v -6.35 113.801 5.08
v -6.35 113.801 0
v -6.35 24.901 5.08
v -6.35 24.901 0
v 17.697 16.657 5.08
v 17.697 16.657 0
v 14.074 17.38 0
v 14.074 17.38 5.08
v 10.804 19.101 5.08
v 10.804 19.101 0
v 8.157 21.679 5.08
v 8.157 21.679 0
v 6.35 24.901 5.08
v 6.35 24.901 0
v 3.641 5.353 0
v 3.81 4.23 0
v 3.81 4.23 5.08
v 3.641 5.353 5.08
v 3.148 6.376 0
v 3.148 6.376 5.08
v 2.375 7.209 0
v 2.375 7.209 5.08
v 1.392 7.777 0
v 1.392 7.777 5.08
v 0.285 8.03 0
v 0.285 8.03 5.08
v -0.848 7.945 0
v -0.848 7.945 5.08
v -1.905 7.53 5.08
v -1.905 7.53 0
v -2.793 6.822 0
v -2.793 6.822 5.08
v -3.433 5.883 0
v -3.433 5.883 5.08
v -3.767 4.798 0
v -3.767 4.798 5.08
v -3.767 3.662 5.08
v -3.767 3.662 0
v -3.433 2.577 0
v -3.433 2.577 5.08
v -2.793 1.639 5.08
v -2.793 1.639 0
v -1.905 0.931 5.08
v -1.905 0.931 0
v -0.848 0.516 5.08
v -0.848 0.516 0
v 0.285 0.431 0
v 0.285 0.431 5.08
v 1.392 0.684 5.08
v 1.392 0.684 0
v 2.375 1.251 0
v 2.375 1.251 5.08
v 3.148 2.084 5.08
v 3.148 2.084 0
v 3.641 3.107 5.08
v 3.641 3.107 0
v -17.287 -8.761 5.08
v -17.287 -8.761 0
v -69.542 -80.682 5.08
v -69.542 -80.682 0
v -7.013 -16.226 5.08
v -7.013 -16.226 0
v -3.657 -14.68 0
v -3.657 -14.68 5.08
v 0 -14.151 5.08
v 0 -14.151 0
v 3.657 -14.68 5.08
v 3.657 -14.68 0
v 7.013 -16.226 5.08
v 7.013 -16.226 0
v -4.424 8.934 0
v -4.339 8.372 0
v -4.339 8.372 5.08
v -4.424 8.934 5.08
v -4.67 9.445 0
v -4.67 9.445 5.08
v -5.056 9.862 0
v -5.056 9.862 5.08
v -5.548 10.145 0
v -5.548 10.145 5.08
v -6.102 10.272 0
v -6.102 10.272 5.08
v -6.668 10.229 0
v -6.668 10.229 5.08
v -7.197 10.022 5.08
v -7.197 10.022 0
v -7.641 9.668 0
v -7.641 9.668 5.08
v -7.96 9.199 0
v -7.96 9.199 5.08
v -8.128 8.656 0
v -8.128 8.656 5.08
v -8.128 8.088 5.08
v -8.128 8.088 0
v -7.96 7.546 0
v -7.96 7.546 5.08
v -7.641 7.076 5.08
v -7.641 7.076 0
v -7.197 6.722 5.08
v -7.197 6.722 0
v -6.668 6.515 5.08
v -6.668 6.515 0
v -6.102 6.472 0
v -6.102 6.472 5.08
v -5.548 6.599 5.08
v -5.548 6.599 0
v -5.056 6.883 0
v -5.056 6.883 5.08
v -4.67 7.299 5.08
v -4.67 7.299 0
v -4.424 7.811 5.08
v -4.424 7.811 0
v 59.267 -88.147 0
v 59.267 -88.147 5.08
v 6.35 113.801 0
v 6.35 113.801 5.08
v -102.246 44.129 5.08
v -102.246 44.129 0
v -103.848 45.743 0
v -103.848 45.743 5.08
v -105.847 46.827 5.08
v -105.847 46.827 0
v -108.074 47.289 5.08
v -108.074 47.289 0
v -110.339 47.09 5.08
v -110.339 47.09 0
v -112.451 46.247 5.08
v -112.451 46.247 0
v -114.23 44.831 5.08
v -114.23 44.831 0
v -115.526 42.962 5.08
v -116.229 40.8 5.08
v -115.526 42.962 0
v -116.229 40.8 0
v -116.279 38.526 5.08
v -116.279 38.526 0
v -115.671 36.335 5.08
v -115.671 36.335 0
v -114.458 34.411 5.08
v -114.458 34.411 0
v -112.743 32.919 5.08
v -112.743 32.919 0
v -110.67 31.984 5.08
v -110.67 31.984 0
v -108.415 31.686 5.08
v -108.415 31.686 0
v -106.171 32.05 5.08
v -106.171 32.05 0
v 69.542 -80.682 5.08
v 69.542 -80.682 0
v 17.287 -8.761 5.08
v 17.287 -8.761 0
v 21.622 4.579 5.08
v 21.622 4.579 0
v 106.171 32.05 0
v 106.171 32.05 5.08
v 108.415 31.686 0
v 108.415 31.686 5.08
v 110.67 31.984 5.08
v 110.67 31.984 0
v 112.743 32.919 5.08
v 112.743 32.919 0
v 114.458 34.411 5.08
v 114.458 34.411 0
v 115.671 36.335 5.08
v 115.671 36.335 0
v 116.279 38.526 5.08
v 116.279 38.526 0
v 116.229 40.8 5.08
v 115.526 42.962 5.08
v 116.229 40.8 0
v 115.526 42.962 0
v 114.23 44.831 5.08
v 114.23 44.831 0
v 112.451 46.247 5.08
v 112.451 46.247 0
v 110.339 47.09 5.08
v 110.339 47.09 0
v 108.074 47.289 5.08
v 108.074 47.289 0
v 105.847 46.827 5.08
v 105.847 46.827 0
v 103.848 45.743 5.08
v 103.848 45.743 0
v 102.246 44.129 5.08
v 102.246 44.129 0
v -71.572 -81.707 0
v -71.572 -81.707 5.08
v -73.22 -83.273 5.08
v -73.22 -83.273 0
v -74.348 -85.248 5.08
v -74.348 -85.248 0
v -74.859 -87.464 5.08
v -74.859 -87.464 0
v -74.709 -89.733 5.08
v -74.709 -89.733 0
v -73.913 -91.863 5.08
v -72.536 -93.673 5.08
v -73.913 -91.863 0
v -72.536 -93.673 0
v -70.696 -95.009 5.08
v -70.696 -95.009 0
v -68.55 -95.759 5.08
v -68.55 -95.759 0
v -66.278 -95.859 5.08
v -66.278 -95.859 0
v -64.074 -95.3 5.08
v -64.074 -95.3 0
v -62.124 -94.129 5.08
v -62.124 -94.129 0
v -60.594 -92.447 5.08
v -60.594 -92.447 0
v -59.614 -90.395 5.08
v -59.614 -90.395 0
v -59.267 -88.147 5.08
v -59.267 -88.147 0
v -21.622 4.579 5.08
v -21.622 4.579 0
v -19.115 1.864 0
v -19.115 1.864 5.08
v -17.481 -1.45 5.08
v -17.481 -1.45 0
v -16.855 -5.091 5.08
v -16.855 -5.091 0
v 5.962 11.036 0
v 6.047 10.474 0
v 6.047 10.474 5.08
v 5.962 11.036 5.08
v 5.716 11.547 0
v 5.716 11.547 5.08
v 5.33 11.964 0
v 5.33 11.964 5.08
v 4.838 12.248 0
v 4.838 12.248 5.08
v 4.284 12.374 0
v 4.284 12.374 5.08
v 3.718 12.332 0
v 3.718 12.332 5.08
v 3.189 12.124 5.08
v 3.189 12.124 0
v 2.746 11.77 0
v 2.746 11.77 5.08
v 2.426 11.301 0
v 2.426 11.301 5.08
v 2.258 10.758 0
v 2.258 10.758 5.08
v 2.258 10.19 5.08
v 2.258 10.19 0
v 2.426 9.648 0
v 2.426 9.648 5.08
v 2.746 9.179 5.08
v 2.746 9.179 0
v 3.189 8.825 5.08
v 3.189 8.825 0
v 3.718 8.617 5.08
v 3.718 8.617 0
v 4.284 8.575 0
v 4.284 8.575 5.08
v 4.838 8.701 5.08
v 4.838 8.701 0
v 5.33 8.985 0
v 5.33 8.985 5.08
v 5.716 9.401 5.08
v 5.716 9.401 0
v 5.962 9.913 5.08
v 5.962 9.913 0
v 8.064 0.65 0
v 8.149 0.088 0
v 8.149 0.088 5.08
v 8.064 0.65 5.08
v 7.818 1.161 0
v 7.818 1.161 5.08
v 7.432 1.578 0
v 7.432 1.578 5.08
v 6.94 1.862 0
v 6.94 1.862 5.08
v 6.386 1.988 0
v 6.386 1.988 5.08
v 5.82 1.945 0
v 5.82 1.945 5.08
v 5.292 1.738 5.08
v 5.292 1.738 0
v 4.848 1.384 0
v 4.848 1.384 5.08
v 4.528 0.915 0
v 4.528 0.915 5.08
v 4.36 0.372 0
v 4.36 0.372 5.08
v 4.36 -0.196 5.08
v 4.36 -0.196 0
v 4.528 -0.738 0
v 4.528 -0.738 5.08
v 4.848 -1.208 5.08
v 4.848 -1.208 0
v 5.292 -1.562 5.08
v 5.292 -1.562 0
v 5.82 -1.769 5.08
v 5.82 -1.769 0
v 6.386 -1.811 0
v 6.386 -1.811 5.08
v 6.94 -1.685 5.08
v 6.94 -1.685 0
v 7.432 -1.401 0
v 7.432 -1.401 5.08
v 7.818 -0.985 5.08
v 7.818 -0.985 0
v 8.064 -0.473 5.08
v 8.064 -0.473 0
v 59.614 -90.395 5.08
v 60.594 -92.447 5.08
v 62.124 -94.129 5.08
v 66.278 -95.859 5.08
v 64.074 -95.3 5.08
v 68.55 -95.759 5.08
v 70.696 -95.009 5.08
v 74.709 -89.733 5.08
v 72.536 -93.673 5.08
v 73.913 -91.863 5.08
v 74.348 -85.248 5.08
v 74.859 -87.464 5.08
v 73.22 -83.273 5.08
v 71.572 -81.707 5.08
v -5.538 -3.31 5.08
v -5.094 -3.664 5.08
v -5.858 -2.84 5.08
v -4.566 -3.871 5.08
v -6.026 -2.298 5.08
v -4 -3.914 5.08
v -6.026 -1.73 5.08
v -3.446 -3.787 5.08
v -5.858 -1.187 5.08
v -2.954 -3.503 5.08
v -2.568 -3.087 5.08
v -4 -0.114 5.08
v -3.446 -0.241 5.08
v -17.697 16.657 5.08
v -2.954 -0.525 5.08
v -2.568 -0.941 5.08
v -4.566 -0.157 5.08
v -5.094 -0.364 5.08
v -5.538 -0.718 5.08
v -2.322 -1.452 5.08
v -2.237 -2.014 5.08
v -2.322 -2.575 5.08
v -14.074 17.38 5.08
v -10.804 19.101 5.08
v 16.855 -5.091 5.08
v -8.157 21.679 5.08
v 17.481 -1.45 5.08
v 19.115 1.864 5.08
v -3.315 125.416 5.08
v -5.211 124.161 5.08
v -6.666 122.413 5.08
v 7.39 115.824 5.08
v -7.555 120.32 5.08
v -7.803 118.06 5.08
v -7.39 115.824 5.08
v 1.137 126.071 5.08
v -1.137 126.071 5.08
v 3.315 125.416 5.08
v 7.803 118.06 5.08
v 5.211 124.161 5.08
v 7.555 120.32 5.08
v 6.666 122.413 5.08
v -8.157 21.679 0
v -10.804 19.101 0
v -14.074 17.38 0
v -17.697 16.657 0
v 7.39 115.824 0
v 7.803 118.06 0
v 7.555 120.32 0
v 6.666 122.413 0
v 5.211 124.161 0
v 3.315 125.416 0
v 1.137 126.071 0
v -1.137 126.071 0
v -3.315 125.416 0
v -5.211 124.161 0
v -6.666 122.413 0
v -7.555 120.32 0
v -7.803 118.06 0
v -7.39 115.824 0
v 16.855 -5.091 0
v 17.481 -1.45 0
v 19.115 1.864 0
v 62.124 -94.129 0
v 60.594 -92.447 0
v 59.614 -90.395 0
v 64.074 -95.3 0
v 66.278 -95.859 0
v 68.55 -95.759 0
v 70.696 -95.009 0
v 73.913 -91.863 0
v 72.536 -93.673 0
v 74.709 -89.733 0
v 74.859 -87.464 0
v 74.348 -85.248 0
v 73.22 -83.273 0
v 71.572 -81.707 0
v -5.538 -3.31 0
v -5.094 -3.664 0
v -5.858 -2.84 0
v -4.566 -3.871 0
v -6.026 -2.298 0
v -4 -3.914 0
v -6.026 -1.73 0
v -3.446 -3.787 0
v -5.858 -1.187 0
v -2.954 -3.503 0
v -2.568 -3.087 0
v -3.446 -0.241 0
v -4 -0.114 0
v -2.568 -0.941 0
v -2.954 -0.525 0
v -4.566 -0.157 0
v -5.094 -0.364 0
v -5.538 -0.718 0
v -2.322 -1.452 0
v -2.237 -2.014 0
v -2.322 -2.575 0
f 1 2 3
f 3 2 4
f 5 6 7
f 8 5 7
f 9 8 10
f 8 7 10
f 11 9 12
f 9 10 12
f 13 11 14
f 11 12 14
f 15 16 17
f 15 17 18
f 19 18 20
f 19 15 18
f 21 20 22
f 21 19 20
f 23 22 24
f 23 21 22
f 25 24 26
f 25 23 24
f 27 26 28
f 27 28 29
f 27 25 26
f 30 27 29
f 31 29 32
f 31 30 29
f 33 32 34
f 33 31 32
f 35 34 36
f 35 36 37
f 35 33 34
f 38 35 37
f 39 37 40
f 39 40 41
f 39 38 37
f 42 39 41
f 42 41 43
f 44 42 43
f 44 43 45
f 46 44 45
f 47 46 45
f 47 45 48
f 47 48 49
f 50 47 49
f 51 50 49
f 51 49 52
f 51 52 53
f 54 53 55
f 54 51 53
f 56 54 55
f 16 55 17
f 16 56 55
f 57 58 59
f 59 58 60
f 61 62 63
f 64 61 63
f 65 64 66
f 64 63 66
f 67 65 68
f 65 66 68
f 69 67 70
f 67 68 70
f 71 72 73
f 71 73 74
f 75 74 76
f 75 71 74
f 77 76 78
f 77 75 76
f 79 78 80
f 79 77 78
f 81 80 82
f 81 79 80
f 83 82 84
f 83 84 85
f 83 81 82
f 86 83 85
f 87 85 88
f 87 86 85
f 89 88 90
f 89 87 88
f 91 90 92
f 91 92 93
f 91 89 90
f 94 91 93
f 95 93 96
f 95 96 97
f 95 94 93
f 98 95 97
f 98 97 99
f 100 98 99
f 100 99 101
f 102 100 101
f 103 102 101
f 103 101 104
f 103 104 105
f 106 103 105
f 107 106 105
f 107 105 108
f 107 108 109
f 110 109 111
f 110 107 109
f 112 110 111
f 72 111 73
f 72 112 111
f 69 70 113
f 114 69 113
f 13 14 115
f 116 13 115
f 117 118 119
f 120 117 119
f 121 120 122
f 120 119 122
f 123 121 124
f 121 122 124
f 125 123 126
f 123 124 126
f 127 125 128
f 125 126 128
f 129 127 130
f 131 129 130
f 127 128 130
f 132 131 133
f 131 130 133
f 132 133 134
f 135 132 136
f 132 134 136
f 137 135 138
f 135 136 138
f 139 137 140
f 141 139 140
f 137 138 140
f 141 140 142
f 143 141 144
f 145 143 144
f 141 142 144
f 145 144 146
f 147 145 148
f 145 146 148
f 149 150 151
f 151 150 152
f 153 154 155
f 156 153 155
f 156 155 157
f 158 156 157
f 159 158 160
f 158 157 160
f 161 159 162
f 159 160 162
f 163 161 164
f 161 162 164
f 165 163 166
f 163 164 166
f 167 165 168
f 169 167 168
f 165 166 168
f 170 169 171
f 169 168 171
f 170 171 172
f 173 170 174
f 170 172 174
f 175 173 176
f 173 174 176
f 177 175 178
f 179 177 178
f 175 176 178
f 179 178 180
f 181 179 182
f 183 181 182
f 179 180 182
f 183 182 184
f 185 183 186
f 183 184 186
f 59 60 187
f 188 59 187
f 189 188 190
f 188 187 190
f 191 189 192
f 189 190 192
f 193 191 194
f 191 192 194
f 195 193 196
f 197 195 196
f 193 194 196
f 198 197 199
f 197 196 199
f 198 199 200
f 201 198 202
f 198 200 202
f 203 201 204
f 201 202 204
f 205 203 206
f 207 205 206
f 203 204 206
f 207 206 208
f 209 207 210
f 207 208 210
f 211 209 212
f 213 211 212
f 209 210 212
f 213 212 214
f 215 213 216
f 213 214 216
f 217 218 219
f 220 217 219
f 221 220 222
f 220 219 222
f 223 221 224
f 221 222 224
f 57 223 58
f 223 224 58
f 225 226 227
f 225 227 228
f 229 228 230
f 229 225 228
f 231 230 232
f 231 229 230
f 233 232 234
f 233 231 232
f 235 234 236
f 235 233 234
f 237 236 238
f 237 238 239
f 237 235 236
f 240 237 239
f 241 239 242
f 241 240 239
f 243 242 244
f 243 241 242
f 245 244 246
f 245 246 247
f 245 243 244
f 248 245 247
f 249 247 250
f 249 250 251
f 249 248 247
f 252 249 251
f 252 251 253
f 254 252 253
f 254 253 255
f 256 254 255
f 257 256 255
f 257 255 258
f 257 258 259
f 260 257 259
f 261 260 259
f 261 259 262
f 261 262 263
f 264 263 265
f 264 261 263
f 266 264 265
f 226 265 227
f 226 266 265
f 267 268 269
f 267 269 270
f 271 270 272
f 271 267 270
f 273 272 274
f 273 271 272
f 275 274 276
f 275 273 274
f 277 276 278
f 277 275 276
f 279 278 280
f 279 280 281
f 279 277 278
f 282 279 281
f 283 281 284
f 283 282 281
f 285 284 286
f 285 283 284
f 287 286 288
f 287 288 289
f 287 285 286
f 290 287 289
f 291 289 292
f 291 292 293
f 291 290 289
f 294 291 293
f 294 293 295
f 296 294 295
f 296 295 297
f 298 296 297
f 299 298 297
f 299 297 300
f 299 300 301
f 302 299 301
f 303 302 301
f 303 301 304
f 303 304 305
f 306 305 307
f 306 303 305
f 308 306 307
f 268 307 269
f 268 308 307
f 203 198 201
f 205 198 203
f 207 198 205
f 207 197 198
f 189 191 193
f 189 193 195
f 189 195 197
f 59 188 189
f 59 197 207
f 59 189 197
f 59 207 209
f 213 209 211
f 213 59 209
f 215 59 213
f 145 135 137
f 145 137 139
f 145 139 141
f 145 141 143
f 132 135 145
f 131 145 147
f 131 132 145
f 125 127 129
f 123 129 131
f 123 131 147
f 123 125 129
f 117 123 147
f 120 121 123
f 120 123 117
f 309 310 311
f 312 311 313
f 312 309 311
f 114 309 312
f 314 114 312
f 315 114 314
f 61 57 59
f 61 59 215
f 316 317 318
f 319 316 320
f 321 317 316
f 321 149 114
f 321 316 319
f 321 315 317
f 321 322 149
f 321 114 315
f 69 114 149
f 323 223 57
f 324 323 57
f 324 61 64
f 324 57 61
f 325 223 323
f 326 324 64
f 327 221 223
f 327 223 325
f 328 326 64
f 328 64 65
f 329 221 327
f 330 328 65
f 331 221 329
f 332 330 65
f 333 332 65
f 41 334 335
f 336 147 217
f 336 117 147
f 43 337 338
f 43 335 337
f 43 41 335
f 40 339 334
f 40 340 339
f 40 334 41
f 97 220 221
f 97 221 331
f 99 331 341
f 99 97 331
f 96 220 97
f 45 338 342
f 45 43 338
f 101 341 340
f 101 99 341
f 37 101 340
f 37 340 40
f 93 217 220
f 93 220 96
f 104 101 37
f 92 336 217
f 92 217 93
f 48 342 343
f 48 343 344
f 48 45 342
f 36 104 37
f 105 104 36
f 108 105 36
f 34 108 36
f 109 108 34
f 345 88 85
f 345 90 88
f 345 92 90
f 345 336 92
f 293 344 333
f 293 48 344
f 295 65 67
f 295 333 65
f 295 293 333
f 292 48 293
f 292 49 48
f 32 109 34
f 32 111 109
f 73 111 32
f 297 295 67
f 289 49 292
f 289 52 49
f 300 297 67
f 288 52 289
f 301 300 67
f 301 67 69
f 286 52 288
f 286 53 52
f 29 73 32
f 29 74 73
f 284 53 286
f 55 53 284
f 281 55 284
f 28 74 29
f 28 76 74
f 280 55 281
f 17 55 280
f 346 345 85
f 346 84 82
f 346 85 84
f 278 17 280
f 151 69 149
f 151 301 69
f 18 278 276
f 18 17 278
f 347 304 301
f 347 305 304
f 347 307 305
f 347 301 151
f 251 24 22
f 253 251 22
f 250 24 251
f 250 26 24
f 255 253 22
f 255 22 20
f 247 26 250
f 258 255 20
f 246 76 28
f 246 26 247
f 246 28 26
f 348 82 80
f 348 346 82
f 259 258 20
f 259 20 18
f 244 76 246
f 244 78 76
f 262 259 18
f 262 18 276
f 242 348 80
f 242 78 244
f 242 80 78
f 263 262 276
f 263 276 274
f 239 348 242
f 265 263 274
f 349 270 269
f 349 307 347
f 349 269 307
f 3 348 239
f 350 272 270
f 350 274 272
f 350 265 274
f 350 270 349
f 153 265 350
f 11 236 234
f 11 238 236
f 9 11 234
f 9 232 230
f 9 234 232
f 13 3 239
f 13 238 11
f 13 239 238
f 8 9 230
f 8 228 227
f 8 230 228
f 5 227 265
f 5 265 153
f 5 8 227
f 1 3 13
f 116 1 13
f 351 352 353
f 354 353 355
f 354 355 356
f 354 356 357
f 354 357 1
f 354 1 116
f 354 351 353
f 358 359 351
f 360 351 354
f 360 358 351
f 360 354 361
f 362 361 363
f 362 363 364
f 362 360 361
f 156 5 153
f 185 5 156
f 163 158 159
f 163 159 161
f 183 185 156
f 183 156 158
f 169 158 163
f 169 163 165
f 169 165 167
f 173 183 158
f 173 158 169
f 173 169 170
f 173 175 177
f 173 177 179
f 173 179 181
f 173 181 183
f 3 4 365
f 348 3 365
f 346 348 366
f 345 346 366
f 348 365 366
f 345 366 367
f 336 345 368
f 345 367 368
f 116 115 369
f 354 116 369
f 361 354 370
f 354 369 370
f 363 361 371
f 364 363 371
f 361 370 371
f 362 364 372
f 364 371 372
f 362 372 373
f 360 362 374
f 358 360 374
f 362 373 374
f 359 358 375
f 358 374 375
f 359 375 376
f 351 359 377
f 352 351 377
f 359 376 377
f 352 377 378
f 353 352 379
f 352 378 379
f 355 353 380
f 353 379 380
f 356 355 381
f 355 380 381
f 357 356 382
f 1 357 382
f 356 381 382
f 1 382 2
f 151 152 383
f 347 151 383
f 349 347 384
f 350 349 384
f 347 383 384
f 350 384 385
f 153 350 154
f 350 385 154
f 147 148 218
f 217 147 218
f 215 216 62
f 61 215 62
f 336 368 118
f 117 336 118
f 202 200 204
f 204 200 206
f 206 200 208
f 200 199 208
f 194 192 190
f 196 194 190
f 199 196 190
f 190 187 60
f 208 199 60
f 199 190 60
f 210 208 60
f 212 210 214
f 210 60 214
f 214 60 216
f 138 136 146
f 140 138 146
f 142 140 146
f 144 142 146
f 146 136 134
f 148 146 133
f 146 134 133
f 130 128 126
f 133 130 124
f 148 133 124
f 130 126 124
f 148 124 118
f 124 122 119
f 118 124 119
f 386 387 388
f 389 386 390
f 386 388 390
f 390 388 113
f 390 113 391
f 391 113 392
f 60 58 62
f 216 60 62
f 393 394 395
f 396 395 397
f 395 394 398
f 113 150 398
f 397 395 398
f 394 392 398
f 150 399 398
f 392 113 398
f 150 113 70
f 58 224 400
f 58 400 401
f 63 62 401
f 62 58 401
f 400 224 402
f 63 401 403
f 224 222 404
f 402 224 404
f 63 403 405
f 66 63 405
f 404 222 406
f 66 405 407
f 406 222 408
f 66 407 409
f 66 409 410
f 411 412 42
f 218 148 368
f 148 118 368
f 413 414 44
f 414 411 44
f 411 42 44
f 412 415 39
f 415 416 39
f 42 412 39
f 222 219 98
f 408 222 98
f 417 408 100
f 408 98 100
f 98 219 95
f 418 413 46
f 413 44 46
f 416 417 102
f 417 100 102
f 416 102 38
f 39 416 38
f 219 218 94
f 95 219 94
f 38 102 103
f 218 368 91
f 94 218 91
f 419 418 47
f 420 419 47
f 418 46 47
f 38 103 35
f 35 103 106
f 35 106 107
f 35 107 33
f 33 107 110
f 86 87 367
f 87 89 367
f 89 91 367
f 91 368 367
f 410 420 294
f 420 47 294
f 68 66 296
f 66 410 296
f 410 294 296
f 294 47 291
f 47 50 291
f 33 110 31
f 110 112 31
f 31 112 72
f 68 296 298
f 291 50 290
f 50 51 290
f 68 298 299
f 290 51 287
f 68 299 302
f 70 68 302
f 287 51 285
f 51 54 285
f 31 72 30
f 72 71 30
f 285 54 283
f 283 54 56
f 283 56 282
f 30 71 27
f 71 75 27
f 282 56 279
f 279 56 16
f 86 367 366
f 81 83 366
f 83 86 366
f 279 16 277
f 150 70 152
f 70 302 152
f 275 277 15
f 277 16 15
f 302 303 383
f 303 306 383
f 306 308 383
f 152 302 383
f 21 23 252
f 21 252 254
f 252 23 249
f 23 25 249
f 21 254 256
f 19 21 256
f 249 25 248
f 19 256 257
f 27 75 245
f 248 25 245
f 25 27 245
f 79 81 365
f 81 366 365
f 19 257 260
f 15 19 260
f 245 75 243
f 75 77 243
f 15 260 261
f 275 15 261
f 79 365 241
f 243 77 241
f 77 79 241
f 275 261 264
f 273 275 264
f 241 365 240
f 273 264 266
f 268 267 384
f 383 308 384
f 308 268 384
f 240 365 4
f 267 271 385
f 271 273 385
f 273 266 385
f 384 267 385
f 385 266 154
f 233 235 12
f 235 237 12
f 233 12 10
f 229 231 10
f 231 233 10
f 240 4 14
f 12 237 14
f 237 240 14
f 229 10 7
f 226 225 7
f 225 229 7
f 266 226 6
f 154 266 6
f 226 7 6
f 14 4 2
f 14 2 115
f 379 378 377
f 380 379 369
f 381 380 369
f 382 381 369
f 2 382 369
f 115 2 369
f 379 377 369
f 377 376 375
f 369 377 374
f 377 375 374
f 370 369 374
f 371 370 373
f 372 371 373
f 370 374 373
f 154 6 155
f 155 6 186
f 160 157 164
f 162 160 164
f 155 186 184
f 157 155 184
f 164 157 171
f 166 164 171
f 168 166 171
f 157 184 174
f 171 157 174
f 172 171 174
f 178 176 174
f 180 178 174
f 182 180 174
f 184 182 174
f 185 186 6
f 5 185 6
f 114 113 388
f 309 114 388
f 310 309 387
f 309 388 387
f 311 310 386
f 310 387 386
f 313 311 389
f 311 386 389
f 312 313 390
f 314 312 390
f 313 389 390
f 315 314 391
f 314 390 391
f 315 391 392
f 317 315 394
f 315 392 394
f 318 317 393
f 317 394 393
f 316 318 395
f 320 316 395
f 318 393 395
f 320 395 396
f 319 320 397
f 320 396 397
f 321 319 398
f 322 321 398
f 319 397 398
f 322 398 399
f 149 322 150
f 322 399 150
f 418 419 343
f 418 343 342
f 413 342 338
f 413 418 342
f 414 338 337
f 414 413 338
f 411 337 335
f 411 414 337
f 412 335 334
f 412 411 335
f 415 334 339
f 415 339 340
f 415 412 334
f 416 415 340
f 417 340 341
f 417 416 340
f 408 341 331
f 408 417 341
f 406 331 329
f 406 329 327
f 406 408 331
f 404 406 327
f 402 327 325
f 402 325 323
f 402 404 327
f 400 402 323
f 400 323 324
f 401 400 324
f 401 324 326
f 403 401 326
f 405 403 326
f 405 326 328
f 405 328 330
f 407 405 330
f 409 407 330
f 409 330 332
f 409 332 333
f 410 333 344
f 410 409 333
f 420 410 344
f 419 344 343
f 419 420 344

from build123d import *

# Parameters (mm, degrees)
F0_R     = 1.905
F0_R_2   = 3.81
F1_DEPTH = 5.08


with BuildPart() as f1:
    # F0 (on Top) → F1 (new body)
    with BuildSketch(Plane.XY):
        with BuildLine():
            ThreePointArc((-6.35, 24.901362), (-10.804149, 19.10083), (-17.697191, 16.657146))
            Line((-17.697191, 16.657146), (-102.246115, 44.128757))
            ThreePointArc((-102.246115, 44.128757), (-115.956738, 41.906823), (-106.170631, 32.050339))
            Line((-106.170631, 32.050339), (-21.621706, 4.578728))
            ThreePointArc((-21.621706, 4.578728), (-17.48148, -1.449882), (-17.287465, -8.760695))
            Line((-17.287465, -8.760695), (-69.541574, -80.682305))
            ThreePointArc((-69.541574, -80.682305), (-71.665205, -94.408498), (-59.267058, -88.147178))
            Line((-59.267058, -88.147178), (-7.01295, -16.225567))
            ThreePointArc((-7.01295, -16.225567), (0, -14.150921), (7.01295, -16.225567))
            Line((7.01295, -16.225567), (59.267058, -88.147178))
            ThreePointArc((59.267058, -88.147178), (71.665205, -94.408498), (69.541574, -80.682305))
            Line((69.541574, -80.682305), (17.287465, -8.760695))
            ThreePointArc((17.287465, -8.760695), (17.48148, -1.449882), (21.621706, 4.578728))
            Line((21.621706, 4.578728), (106.170631, 32.050339))
            ThreePointArc((106.170631, 32.050339), (115.956738, 41.906823), (102.246115, 44.128757))
            Line((102.246115, 44.128757), (17.697191, 16.657146))
            ThreePointArc((17.697191, 16.657146), (10.804149, 19.10083), (6.35, 24.901362))
            Line((6.35, 24.901362), (6.35, 113.801362))
            ThreePointArc((6.35, 113.801362), (0, 126.154324), (-6.35, 113.801362))
            Line((-6.35, 113.801362), (-6.35, 24.901362))
        make_face()
        with Locations((-4.141972, -2.013932)):
            Circle(F0_R, mode=Mode.SUBTRACT)
        with Locations((0, 4.230195)):
            Circle(F0_R_2, mode=Mode.SUBTRACT)
        with Locations((-6.244127, 8.372167)):
            Circle(F0_R, mode=Mode.SUBTRACT)
        with Locations((6.244127, 0.088223)):
            Circle(F0_R, mode=Mode.SUBTRACT)
        with Locations((4.141972, 10.474322)):
            Circle(F0_R, mode=Mode.SUBTRACT)
    extrude(amount=F1_DEPTH)


solid = f1.part
